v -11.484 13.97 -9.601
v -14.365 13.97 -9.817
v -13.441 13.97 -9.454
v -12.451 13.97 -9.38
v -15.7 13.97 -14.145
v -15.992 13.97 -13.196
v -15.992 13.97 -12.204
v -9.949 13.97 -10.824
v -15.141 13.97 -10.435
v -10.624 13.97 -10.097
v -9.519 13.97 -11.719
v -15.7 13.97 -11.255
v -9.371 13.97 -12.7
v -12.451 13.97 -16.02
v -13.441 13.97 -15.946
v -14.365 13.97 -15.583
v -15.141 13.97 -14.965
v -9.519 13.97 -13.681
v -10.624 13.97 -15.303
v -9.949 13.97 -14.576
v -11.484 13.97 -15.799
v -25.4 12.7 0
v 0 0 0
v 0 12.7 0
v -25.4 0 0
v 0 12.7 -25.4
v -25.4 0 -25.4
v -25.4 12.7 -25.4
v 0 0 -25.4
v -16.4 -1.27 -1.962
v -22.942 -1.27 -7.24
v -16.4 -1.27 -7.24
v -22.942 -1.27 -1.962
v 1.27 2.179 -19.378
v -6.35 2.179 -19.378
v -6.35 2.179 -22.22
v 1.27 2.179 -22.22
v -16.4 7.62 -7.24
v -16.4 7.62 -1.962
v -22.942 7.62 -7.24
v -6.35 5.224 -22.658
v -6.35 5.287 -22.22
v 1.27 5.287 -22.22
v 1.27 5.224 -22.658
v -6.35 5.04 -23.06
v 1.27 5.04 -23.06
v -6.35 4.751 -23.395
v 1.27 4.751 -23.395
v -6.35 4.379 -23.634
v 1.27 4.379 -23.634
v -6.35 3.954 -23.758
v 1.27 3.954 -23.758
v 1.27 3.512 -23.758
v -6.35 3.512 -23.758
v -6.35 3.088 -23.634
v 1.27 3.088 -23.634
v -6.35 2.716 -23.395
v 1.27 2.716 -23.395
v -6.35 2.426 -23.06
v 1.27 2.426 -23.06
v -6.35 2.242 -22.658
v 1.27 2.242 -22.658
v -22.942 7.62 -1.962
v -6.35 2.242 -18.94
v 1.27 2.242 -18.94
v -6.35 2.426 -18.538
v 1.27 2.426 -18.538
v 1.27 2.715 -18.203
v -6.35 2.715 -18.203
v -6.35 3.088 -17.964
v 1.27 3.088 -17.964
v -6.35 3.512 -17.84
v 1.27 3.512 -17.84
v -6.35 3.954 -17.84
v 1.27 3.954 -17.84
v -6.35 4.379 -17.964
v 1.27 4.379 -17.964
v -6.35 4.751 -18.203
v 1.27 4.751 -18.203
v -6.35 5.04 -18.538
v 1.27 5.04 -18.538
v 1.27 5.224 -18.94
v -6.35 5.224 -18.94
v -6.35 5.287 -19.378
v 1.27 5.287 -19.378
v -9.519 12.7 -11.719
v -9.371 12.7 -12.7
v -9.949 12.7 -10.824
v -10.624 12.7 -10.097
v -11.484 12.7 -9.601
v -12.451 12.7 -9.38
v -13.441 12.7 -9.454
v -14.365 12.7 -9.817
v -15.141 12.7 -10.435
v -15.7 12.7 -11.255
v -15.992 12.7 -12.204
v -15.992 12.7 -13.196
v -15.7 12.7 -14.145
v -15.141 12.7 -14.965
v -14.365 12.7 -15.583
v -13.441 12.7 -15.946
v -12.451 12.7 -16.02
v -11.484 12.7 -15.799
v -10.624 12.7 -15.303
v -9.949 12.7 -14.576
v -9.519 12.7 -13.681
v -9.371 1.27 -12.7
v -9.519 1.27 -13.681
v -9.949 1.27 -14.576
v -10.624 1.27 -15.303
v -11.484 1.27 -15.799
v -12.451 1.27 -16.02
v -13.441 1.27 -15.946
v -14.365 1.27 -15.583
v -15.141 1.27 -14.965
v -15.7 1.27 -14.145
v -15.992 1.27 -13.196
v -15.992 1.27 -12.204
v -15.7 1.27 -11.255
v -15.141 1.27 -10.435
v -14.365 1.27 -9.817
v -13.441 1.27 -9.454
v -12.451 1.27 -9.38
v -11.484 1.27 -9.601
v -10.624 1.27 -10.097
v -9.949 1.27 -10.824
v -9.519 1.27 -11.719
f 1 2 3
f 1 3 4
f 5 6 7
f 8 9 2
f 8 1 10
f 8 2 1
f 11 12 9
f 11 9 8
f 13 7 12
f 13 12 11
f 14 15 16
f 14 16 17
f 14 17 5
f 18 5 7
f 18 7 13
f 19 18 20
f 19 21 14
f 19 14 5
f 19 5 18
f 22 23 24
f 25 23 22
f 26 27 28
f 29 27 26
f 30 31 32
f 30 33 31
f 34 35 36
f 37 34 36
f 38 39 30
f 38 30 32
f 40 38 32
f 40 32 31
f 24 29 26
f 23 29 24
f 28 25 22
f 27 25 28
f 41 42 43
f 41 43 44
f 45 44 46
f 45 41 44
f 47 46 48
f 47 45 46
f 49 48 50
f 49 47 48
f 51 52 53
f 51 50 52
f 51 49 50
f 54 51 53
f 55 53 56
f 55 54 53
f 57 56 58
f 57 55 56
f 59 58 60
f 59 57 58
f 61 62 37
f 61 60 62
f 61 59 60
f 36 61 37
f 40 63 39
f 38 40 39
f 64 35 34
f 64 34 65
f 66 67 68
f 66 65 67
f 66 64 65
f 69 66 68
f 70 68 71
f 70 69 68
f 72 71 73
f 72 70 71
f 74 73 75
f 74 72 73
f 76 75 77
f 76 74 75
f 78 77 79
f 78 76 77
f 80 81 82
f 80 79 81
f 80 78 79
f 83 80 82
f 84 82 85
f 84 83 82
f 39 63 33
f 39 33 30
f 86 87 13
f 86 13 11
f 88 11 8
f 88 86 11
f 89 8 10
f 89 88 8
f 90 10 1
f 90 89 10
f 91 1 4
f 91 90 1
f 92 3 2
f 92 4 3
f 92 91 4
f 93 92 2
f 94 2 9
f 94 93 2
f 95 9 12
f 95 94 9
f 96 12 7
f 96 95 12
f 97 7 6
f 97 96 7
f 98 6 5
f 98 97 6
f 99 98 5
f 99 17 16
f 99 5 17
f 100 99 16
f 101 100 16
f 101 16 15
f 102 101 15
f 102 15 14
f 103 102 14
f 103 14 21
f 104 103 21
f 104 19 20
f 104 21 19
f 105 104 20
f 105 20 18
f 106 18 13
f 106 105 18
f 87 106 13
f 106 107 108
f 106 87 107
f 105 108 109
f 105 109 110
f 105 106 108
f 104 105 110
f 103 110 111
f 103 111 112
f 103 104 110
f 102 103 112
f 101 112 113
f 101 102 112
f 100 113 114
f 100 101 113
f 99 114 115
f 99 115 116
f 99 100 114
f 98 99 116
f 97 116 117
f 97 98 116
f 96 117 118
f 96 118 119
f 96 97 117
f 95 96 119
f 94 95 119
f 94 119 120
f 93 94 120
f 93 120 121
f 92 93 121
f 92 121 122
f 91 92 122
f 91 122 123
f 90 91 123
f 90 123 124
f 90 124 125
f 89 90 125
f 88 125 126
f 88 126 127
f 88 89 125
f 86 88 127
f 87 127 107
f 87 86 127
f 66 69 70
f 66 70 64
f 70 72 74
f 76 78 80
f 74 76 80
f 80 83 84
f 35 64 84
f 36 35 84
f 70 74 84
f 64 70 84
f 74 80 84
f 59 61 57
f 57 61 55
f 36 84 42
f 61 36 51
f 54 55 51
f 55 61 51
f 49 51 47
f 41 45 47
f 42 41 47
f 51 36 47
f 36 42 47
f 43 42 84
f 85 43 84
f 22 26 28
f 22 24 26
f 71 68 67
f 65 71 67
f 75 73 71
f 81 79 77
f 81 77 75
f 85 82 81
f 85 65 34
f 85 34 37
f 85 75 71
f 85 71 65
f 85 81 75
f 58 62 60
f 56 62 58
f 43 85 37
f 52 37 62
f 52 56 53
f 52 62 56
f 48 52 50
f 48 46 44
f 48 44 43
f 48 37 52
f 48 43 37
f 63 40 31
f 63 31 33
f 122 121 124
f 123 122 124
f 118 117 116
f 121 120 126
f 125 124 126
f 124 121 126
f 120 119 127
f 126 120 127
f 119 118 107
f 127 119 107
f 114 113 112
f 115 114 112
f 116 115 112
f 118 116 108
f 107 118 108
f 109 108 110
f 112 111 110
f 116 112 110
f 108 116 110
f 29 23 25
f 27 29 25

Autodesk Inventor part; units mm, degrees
ref_plane "YZ Plane" through (0, 0, 0) normal (1, 0, 0) x (0, 1, 0)
ref_plane "XZ Plane" through (0, 0, 0) normal (0, 1, 0) x (-1, 0, 0)
ref_plane "XY Plane" through (0, 0, 0) normal (0, 0, 1) x (1, 0, 0)
sketch "Sketch1" plane through (0, 0, 0) normal (0, 1, 0) x (-1, 0, 0)
  line L0 (0, 0) -> (25.4, 0)
  line L1 (25.4, 0) -> (25.4, -25.4)
  line L2 (25.4, -25.4) -> (0, -25.4)
  line L3 (0, -25.4) -> (0, 0)
  dimension "d0" = 25.4
  dimension "d1" = 25.4
extrude "Extrusion1" add sketch "Sketch1" along normal blind 12.7
sketch "Sketch2" plane through (0, 12.7, 0) normal (0, 1, 0) x (1, 0, 0)
  circle A0 centre (-12.7, 12.7) radius 3.3294
extrude "Extrusion2" add sketch "Sketch2" along normal blind 1.27 and the other way blind 11.43 separate body
sketch "Sketch3" plane through (0, 0, 0) normal (0, -1, 0) x (1, 0, 0)
  line L0 (-22.9422, -1.9615) -> (-16.3998, -1.9615)
  line L1 (-16.3998, -1.9615) -> (-16.3998, -7.2405)
  line L2 (-16.3998, -7.2405) -> (-22.9422, -7.2405)
  line L3 (-22.9422, -7.2405) -> (-22.9422, -1.9615)
extrude "Extrusion3" add sketch "Sketch3" along normal blind 1.27 and the other way blind 7.62 separate body
sketch "Sketch4" plane through (0, 0, 0) normal (1, 0, 0) x (0, 0, -1)
  line L0 (25.4, 0) -> (0, 0) projected
  line L1 (19.3778, 3.733) -> (22.2203, 3.733) construction
  line L2 (19.3778, 2.1792) -> (22.2203, 2.1792)
  line L3 (22.2203, 5.2869) -> (19.3778, 5.2869)
  arc A0 (19.3778, 5.2869) -> (19.3778, 2.1792) centre (19.3778, 3.733) ccw
  arc A1 (22.2203, 2.1792) -> (22.2203, 5.2869) centre (22.2203, 3.733) ccw
  point P0 (20.799, 3.733)
extrude "Extrusion4" add sketch "Sketch4" along normal blind 1.27 and the other way blind 6.35 separate body
properties part number "Remnant3Features"
